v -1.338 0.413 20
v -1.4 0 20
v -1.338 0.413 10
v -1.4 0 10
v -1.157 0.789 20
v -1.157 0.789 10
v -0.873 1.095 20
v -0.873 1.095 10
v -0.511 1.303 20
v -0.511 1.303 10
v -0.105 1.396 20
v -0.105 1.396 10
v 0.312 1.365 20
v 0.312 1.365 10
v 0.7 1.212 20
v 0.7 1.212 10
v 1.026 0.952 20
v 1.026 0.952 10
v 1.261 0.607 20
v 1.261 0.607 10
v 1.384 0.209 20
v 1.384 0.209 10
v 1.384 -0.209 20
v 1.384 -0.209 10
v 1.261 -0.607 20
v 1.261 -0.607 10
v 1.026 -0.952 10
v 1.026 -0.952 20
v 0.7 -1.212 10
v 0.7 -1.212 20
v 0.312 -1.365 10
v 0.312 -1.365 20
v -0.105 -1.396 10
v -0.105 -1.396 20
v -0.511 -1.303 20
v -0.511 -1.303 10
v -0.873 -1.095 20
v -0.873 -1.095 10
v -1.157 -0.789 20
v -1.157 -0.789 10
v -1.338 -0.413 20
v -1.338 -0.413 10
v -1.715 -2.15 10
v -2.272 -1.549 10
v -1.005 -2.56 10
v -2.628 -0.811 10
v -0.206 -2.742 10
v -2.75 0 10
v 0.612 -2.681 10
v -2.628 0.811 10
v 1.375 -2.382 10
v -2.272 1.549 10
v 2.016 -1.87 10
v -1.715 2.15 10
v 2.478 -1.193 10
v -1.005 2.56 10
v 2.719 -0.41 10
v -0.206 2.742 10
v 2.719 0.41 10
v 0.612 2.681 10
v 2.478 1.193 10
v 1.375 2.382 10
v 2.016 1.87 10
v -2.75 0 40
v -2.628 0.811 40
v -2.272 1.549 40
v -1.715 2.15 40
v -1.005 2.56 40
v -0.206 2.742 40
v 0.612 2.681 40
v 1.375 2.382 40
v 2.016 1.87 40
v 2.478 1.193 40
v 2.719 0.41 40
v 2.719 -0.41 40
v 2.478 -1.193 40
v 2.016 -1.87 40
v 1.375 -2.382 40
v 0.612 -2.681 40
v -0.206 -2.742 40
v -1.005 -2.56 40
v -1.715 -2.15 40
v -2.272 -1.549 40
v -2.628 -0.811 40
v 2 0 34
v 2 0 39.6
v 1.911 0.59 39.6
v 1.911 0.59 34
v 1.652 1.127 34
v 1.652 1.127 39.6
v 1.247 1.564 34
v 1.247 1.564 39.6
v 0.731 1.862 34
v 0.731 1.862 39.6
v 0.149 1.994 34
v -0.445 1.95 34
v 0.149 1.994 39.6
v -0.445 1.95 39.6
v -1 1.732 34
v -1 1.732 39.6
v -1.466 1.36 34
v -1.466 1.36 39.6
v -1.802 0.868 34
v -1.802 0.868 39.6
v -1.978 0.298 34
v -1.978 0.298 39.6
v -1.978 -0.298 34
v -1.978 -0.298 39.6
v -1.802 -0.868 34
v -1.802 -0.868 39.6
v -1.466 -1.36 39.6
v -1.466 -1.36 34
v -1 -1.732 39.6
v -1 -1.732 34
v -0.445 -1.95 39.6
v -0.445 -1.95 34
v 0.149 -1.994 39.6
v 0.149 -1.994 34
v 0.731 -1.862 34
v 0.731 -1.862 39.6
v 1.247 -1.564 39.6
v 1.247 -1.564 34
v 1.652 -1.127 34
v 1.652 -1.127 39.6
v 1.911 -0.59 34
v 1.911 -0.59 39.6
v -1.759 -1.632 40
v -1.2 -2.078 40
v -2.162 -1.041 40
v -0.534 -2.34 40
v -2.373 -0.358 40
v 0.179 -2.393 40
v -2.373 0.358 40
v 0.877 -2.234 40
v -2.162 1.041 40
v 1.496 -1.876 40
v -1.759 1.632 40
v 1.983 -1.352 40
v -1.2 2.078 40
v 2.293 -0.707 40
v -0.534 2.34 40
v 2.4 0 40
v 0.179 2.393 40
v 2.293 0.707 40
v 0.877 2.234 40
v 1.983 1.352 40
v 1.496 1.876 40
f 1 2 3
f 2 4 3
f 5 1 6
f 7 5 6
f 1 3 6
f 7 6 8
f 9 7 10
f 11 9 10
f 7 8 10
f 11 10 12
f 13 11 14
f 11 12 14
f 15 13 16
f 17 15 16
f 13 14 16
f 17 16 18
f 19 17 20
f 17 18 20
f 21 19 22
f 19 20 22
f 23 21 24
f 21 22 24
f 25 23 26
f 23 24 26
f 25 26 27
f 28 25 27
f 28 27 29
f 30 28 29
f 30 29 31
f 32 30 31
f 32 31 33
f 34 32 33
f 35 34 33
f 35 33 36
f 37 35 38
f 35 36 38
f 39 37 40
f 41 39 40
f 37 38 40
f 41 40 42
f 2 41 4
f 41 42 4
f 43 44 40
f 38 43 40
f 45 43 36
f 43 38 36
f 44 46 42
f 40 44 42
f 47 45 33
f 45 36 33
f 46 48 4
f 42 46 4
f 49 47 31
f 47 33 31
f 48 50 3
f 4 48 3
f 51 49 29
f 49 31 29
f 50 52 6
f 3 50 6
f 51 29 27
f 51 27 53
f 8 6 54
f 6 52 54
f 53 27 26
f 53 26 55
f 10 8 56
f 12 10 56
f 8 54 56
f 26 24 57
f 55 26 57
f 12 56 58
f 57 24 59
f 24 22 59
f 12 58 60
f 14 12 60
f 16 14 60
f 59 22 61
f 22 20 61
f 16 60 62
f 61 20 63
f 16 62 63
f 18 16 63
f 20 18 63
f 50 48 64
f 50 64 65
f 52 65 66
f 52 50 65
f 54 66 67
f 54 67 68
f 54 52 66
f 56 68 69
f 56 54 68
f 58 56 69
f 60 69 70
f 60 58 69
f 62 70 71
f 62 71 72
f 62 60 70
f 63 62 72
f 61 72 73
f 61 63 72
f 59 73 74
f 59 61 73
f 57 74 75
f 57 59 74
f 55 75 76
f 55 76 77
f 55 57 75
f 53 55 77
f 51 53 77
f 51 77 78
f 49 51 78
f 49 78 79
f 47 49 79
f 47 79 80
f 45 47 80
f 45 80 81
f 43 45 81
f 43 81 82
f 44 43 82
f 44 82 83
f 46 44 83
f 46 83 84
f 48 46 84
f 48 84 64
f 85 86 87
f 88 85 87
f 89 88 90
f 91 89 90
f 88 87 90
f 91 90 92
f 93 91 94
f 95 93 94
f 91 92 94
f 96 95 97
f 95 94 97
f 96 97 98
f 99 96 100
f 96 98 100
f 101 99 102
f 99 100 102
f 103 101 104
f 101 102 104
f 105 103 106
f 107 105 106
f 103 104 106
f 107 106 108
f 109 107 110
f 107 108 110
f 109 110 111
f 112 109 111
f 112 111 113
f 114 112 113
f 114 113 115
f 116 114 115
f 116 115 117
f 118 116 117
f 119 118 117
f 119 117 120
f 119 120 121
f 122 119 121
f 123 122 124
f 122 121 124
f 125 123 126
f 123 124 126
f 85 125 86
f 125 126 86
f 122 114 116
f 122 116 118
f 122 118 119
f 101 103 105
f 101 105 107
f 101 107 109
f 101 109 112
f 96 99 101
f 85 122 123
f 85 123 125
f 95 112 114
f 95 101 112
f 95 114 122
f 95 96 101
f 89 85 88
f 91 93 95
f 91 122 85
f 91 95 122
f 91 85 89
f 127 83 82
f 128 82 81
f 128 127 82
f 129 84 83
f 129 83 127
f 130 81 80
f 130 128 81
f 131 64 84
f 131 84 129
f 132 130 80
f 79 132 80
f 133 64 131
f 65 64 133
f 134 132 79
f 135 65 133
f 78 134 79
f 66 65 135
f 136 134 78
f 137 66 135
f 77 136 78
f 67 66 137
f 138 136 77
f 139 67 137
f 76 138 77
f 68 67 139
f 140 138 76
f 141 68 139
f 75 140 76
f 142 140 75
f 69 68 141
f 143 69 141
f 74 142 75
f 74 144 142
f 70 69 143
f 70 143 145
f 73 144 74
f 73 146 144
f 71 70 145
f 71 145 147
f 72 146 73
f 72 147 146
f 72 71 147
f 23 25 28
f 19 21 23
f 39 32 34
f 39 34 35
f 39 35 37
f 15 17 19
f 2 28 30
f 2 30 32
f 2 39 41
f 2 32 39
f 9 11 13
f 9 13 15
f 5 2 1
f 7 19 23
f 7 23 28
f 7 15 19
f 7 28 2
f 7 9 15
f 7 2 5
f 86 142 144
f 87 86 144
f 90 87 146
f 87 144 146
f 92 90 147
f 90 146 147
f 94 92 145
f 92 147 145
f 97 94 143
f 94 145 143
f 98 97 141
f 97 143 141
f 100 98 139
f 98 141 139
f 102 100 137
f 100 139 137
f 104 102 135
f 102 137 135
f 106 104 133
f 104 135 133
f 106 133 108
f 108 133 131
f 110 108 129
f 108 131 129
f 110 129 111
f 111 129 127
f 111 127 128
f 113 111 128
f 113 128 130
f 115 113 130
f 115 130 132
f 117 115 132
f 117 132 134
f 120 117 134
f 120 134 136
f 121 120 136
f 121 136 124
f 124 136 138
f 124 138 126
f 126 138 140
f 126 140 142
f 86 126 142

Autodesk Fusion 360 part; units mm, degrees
sketch "Esboço1" plane through (0, 0, 0) normal (0, 0, 1) x (1, 0, 0)
  circle A0 centre (0, 0) radius 3
  dimension "d1" = 6
extrude "Extrusão1" add sketch "Esboço1" along normal blind 40
sketch "Esboço2" plane through (0, 0, 40) normal (0, 0, 1) x (1, 0, 0)
  circle A0 centre (0, 0) radius 3
  circle A1 centre (0, 0) radius 2
  dimension "d4" = 4
extrude "Extrusão2" cut sketch "Esboço2" against normal blind 4 contours A1
extrude "Extrusão3" cut 1 faces at (-1.1591, 0.5829, 0) along direction (0, 0, 1) blind 10
extrude "Extrusão4" cut 1 faces at (0.637, 0.1965, 36) along direction (0, 0, -1) blind 1
chamfer "Chanfro1" distance 0.4 angle 45 1 edges at (-1.8647, 0.7232, 40)
sketch "Esboço3" plane through (0, 0, 10) normal (0, 0, -1) x (-1, 0, 0)
  circle A0 centre (0, 0) radius 3
  circle A1 centre (0, 0) radius 1.4
  dimension "d12" = 2.8
extrude "Extrusão5" cut sketch "Esboço3" against normal blind 10 contours A1
sketch "Esboço4" plane through (0, 0, 10) normal (0, 0, -1) x (-1, 0, 0)
  circle A0 centre (0, 0) radius 1.4
  circle A1 centre (0, 0) radius 3
  circle A2 centre (0, 0) radius 3
  circle A3 centre (0, 0) radius 2.75
  dimension "d15" = 5.5
extrude "Extrusão6" cut sketch "Esboço4" against normal blind 34 contours A1 A2
extrude "Extrusão7" cut 1 faces at (0.637, 0.1965, 35) along direction (0, 0, -1) blind 1
